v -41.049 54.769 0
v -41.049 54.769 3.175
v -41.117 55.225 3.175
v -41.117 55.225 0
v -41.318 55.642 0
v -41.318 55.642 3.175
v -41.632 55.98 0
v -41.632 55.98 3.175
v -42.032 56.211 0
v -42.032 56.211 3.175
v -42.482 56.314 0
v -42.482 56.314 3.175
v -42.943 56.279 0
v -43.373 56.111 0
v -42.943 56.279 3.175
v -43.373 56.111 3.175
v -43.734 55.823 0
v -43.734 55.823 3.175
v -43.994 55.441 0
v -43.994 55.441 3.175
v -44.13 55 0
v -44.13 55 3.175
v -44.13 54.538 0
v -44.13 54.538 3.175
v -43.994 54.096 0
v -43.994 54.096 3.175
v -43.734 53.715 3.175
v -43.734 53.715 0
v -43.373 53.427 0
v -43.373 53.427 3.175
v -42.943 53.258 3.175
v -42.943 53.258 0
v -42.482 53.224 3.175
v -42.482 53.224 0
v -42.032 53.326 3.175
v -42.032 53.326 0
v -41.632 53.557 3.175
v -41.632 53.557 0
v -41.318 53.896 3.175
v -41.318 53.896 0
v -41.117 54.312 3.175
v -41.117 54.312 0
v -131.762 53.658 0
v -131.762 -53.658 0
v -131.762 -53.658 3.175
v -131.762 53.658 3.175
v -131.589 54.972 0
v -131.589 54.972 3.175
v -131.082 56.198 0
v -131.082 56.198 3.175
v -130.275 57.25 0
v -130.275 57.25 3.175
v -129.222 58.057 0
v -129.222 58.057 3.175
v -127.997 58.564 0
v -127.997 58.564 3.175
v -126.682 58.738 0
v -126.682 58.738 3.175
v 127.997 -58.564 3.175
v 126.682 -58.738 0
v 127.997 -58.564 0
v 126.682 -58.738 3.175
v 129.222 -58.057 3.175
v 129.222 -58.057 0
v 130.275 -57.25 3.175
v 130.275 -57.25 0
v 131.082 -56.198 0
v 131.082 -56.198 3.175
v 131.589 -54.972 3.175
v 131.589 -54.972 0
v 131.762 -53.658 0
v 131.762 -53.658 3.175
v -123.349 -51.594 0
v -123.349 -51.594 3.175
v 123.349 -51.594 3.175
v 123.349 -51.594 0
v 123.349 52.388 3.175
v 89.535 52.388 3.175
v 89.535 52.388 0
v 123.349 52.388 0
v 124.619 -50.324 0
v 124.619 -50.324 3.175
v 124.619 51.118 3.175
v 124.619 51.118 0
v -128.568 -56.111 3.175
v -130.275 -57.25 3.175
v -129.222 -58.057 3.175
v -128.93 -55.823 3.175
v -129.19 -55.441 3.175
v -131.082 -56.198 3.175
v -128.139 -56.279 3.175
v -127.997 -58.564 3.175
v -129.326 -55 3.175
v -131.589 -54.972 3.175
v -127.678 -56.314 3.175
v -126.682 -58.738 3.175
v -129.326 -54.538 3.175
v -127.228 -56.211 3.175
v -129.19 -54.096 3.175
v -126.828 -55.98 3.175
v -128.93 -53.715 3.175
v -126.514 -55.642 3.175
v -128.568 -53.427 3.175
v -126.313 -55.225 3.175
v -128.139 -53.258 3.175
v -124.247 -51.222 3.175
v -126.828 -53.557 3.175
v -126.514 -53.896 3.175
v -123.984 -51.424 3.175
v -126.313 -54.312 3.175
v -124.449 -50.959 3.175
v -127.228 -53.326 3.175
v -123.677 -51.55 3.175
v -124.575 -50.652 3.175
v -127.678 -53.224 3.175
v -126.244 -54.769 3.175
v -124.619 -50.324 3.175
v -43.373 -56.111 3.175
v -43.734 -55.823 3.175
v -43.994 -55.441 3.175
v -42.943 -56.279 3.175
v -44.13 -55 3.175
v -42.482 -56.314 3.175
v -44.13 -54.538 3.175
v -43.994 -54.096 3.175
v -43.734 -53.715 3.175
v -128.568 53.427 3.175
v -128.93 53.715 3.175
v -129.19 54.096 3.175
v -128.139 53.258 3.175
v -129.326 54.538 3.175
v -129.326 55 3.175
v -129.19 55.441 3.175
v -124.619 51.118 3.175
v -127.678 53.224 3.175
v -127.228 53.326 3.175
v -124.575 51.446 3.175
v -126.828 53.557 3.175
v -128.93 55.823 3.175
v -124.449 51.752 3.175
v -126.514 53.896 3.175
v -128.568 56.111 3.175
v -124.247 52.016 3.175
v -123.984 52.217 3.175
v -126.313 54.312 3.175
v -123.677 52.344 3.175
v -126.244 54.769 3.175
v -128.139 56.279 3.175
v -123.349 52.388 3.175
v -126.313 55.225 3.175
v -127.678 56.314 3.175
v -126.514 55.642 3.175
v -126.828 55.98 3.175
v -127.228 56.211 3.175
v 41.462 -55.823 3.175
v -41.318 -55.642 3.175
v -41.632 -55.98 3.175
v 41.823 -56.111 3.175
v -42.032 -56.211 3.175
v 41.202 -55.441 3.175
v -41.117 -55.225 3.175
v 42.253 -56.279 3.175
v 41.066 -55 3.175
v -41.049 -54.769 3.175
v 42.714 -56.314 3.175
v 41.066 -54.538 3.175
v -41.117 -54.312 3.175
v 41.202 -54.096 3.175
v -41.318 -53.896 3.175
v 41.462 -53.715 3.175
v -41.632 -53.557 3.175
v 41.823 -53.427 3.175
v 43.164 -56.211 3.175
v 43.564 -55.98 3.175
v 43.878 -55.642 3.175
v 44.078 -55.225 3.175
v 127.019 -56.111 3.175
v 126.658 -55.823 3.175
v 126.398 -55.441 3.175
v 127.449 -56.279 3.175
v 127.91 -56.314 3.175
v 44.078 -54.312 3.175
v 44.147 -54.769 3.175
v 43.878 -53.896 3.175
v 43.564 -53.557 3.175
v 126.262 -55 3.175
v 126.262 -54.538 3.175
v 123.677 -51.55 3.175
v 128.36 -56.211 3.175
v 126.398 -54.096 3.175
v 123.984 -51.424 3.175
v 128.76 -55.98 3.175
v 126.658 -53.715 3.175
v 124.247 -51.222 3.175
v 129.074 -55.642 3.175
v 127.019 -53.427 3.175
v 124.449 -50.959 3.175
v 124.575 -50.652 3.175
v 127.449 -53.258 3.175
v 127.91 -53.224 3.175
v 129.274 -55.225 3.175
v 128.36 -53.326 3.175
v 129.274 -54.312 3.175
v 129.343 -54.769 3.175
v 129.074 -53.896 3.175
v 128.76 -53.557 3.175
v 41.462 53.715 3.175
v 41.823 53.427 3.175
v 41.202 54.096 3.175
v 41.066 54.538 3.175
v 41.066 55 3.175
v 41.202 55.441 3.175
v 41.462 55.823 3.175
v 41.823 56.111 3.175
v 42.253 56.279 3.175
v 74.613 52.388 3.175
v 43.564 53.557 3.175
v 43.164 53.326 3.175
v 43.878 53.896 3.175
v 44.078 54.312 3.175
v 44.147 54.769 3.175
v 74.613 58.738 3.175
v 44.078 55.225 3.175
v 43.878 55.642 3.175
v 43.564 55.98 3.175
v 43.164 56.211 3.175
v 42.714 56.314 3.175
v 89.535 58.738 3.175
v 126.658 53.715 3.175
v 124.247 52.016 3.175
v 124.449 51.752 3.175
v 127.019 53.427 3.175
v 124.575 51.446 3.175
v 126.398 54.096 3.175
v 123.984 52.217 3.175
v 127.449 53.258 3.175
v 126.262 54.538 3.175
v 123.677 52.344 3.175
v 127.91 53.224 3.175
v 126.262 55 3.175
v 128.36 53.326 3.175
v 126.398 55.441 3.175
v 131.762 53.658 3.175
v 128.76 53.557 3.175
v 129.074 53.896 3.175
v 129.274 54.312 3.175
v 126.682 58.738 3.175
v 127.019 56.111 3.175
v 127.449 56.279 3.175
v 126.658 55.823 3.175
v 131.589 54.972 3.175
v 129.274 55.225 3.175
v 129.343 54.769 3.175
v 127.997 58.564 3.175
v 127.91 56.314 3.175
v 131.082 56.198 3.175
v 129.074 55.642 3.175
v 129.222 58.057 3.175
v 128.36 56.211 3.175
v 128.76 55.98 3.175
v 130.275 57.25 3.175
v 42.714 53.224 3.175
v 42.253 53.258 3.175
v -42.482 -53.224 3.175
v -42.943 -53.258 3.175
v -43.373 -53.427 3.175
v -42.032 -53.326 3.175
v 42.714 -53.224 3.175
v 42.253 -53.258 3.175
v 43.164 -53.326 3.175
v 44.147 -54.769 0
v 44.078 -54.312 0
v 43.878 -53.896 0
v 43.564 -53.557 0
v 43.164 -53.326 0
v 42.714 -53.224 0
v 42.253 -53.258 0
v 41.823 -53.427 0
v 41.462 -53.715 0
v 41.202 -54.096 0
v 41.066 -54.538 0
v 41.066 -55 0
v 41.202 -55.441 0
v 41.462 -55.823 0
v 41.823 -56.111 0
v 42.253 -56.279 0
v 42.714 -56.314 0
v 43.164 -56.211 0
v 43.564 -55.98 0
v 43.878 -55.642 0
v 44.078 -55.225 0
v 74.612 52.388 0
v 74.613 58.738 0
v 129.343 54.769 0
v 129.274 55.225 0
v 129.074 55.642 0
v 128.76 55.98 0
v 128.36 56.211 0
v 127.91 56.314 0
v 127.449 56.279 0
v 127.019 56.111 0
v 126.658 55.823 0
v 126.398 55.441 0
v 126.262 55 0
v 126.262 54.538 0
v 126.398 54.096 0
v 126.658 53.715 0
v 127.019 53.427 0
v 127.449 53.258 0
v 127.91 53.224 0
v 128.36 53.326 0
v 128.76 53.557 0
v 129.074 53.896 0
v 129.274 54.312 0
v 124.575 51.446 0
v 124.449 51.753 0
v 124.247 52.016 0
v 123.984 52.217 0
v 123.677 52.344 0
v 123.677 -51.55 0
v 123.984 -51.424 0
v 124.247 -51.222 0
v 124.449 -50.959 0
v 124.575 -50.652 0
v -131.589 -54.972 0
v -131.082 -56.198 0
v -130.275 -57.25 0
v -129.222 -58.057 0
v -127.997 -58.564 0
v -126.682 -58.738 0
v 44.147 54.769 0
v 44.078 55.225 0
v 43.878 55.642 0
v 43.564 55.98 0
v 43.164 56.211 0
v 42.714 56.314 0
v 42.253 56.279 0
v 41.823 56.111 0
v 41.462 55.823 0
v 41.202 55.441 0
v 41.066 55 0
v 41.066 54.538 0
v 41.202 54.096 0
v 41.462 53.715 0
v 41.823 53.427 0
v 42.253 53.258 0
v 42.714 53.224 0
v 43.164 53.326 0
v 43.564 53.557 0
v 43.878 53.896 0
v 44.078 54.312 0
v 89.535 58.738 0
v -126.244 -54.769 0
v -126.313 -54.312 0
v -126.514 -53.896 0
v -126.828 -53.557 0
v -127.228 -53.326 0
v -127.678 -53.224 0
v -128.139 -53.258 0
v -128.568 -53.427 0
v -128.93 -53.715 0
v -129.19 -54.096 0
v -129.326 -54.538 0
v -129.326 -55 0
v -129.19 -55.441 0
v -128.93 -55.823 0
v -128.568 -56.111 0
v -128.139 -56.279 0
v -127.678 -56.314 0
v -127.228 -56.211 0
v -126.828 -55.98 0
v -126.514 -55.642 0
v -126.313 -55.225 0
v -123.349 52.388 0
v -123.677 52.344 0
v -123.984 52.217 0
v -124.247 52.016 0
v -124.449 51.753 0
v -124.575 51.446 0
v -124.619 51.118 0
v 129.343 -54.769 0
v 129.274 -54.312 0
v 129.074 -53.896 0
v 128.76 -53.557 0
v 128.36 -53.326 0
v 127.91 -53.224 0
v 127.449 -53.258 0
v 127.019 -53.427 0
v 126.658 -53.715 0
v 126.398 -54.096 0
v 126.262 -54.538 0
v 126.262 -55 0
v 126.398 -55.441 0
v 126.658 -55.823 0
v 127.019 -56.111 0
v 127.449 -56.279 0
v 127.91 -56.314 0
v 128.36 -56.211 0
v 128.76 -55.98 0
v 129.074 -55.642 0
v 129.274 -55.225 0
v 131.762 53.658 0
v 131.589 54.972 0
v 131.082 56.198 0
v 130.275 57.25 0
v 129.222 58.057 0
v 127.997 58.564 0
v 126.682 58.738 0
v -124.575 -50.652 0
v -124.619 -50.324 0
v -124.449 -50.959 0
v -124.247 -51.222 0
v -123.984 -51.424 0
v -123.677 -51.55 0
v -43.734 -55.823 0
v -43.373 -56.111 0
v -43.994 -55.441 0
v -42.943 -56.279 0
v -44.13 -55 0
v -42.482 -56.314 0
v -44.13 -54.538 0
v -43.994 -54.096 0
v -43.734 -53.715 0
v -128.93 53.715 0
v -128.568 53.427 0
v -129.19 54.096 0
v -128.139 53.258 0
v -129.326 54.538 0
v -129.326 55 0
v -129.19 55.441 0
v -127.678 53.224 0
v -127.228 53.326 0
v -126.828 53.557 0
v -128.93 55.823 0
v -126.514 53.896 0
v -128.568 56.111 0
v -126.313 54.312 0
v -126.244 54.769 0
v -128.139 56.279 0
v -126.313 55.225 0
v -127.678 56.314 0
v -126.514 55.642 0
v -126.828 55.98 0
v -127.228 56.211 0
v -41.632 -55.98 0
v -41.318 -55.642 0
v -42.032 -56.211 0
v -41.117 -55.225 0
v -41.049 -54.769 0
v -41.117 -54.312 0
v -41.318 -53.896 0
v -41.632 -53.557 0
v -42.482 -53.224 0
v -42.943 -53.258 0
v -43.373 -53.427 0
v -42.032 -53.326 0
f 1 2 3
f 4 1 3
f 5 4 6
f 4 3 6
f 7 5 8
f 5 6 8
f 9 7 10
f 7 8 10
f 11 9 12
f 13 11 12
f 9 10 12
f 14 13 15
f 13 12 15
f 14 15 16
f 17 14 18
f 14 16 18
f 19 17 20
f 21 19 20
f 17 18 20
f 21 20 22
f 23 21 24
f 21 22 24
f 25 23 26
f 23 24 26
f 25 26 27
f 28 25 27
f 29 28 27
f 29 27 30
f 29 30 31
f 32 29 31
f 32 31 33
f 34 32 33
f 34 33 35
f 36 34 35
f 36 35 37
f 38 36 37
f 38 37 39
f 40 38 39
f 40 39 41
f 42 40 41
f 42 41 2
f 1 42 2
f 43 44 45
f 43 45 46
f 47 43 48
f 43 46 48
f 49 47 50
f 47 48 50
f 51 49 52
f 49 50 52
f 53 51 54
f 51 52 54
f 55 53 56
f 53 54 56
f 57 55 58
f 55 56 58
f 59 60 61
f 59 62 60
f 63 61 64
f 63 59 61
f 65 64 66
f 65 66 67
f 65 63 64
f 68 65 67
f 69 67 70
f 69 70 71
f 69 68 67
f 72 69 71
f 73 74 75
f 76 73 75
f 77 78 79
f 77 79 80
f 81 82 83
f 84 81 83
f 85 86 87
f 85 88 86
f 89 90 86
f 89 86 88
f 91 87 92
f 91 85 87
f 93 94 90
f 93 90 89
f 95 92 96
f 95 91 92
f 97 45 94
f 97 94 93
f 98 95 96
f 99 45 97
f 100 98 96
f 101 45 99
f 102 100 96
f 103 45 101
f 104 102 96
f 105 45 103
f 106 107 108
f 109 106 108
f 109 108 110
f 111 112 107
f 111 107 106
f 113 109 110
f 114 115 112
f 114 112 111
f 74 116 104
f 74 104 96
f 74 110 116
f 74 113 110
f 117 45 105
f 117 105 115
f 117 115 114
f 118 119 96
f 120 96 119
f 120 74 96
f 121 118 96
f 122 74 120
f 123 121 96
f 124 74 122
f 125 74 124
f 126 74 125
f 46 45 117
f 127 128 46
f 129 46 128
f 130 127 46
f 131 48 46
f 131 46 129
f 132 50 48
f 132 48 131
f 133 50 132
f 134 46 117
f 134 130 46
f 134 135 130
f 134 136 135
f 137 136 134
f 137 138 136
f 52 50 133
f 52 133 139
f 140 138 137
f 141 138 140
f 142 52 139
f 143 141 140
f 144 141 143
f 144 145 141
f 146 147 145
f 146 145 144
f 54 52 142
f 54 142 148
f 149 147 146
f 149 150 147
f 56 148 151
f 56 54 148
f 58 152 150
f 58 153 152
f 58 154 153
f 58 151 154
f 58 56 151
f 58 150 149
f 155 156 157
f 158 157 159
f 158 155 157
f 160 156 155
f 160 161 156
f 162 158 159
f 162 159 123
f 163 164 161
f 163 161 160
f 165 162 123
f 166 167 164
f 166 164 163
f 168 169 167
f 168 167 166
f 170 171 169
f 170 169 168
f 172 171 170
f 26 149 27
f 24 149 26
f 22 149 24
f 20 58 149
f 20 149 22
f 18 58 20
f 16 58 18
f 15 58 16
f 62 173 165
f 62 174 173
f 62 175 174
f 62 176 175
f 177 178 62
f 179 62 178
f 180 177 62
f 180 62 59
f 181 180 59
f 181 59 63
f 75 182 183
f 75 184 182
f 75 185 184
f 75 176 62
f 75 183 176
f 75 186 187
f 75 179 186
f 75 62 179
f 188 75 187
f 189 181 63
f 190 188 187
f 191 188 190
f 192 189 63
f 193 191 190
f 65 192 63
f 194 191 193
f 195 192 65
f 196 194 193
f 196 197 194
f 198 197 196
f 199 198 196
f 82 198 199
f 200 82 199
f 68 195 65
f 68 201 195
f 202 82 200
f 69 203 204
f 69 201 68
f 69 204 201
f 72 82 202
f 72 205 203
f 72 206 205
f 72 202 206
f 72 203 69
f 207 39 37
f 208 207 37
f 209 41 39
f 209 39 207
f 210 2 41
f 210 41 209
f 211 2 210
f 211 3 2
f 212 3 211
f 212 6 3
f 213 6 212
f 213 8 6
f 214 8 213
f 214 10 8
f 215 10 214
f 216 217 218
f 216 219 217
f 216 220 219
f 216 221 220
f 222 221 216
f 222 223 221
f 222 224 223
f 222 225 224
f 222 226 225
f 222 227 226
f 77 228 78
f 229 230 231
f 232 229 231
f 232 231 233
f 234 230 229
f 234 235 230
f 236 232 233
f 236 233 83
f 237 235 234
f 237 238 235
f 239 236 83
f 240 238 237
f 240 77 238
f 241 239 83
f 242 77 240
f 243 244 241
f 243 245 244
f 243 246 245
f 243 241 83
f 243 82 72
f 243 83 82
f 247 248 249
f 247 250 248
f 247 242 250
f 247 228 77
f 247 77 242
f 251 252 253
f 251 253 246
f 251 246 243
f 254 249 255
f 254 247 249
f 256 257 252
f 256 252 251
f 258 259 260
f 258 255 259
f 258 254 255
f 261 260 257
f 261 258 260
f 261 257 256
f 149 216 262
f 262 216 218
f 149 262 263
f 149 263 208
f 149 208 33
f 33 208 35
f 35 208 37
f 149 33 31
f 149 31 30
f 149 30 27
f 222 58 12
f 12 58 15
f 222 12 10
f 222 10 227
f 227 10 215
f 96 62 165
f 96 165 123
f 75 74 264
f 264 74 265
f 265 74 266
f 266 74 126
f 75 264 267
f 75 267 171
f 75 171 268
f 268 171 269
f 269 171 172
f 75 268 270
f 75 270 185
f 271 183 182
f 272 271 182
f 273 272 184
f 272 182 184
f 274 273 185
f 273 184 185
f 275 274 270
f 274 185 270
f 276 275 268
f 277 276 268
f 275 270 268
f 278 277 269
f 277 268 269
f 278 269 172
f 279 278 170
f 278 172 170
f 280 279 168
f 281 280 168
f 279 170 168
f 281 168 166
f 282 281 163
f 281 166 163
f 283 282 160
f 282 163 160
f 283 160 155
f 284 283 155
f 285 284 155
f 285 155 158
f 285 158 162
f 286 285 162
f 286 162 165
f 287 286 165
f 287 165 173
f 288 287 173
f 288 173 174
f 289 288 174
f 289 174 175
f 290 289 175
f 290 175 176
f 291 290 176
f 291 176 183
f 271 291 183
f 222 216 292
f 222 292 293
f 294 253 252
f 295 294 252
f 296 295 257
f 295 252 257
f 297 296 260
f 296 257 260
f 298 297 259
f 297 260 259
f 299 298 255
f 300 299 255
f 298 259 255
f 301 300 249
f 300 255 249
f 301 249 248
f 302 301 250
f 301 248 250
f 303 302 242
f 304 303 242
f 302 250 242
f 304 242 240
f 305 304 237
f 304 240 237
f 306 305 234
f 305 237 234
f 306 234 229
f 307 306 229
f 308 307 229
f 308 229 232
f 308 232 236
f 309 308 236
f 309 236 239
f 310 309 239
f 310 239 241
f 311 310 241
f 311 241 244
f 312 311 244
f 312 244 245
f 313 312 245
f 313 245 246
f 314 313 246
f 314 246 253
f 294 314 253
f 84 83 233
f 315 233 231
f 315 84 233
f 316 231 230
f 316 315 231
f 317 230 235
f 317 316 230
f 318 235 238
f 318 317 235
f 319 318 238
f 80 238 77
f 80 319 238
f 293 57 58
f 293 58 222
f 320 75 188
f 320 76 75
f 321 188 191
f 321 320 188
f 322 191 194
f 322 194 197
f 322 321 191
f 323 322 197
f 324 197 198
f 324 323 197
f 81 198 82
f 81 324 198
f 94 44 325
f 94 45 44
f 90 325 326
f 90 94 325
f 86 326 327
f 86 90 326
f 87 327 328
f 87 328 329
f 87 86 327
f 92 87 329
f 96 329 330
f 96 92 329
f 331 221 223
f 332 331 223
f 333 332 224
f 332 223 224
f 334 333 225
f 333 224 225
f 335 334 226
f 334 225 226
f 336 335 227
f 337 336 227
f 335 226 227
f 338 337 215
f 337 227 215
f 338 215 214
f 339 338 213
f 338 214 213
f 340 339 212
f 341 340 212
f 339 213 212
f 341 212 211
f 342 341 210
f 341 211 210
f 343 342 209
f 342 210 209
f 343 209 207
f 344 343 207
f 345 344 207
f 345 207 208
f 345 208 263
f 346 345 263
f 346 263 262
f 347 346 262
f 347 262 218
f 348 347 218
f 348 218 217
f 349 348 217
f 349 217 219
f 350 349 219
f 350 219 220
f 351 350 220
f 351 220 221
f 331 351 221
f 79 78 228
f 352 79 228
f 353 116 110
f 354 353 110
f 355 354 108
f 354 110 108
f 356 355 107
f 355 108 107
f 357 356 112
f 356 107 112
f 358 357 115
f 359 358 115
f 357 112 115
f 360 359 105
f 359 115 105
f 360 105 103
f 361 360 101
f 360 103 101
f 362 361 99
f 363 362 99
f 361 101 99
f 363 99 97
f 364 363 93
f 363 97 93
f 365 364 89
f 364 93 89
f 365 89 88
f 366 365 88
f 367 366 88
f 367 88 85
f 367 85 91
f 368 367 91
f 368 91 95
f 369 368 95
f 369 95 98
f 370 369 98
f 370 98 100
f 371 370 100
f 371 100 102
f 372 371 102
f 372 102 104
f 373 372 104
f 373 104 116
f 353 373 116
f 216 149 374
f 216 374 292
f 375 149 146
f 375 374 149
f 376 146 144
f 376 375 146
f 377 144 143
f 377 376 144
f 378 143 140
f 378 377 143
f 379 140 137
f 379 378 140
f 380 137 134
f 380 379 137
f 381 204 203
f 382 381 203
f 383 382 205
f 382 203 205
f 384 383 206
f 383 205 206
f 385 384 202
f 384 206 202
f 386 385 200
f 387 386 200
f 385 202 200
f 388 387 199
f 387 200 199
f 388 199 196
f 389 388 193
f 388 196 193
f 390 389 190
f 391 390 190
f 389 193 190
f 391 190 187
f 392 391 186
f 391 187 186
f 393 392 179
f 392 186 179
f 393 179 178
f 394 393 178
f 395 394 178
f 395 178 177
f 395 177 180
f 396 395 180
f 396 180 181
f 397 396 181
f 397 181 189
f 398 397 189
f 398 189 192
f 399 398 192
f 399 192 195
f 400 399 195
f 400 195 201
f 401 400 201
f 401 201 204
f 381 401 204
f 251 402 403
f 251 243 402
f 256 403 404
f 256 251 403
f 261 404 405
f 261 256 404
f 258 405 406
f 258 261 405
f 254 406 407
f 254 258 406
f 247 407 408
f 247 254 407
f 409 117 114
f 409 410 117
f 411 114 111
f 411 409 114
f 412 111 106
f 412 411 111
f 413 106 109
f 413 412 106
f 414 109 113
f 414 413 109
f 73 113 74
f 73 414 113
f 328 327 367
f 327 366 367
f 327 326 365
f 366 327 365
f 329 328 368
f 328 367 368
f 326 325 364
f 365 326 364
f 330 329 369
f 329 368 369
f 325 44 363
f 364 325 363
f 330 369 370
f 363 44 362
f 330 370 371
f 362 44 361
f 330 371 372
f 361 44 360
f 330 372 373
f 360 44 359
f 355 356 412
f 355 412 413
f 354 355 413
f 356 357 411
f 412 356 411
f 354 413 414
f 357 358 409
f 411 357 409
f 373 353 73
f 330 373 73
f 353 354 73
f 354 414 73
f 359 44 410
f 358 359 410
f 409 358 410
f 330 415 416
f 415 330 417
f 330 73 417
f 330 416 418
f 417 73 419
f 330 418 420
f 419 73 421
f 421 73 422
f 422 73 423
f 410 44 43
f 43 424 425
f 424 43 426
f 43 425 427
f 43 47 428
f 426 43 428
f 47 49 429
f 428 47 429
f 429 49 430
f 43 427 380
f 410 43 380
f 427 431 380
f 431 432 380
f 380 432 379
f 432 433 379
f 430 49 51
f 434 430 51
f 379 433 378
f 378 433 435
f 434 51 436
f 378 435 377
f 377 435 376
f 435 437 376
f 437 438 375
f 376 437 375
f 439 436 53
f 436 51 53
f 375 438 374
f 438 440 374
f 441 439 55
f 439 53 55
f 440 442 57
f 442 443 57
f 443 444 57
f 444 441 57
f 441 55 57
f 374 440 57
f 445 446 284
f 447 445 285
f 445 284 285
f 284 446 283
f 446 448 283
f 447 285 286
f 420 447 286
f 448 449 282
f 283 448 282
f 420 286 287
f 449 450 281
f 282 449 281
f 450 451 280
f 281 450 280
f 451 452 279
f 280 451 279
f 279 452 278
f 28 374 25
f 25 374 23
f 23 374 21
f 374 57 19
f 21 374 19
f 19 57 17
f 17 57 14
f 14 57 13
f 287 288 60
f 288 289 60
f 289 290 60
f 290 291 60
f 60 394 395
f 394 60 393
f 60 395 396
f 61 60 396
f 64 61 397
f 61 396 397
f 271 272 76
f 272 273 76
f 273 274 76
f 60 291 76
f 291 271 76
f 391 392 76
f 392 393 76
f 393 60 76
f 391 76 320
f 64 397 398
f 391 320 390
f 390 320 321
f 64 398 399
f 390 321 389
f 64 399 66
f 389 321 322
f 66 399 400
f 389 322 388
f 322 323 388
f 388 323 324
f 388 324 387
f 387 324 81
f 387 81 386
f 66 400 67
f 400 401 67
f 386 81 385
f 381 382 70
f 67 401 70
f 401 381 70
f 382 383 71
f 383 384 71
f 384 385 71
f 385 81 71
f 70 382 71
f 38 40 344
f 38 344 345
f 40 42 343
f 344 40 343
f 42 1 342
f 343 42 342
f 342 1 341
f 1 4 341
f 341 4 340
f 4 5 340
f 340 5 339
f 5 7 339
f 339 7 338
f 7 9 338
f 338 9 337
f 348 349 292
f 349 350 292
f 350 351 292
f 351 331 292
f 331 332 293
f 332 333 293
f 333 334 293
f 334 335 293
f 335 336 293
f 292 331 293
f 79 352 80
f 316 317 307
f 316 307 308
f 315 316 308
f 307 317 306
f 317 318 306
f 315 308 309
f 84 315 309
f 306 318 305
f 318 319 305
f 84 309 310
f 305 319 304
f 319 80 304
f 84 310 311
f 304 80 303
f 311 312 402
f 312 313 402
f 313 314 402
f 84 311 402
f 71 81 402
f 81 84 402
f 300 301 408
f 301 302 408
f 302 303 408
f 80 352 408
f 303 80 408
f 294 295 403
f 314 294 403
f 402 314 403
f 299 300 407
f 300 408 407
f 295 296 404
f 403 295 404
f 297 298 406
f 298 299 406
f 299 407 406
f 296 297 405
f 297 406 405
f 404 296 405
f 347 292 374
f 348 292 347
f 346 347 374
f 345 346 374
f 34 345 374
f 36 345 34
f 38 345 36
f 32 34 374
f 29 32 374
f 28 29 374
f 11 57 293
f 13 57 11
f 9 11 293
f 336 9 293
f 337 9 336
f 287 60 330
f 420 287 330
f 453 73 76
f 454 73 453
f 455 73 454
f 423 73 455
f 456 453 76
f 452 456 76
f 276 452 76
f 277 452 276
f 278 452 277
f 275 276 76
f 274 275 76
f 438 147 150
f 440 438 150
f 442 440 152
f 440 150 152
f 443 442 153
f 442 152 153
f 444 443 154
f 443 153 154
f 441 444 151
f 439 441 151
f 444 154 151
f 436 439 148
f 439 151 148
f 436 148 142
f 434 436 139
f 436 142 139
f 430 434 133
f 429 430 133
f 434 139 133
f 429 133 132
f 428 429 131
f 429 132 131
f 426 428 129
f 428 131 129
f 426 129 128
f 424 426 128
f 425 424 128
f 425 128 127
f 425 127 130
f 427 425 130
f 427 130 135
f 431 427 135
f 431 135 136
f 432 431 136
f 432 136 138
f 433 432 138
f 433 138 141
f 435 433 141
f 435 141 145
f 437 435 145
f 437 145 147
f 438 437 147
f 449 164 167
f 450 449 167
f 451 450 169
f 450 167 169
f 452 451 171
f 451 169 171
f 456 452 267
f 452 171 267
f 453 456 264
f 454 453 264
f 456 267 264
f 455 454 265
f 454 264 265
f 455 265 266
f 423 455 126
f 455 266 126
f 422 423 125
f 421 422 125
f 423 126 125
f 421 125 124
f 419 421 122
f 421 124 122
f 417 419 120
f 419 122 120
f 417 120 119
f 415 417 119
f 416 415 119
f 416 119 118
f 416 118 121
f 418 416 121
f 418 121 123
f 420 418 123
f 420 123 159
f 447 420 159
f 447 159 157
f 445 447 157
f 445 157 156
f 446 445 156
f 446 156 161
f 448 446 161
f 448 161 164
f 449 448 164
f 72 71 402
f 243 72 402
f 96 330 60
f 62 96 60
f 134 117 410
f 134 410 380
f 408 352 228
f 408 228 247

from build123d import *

# Parameters (mm, degrees)
SKETCH_W        = 263.525
SKETCH_H        = 117.475
PAD_DEPTH       = 3.175
SKETCH002_W     = 249.2375
SKETCH002_H     = 103.98125
POCKET_DEPTH    = 3.176
SKETCH003_W     = 14.9225
SKETCH003_H     = 25.4
POCKET001_DEPTH = 3.176
SKETCH001_R     = 1.5494
HOLE_DEPTH      = 3.176
FILLET_R        = 5.08
FILLET001_R     = 1.27


with BuildPart() as part:
    # Sketch → Pad (new body)
    with BuildSketch(Plane.XY):
        Rectangle(SKETCH_W, SKETCH_H)
    extrude(amount=PAD_DEPTH)

    # Sketch002 (on Face6 of Pad) → Pocket (cut, through all)
    with BuildSketch(Plane.XY.offset(3.175)):
        with Locations((0, 0.396875)):
            Rectangle(SKETCH002_W, SKETCH002_H)
    extrude(amount=-POCKET_DEPTH, mode=Mode.SUBTRACT)

    # Sketch003 (on Face5 of Pocket) → Pocket001 (cut, through all)
    with BuildSketch(Plane.XY.offset(3.175)):
        with Locations((82.07375, 46.0375)):
            Rectangle(SKETCH003_W, SKETCH003_H)
    extrude(amount=-POCKET001_DEPTH, mode=Mode.SUBTRACT)

    # Sketch001 (on Face6 of Pad) → Hole (cut, through all)
    with BuildSketch(Plane.XY.offset(3.175)):
        with Locations((-42.597917, 54.76875)):
            Circle(SKETCH001_R)
        with Locations((42.597917, 54.76875)):
            Circle(SKETCH001_R)
        with Locations((42.597917, -54.76875)):
            Circle(SKETCH001_R)
        with Locations((-42.597917, -54.76875)):
            Circle(SKETCH001_R)
        with Locations((-127.79375, -54.76875)):
            Circle(SKETCH001_R)
        with Locations((-127.79375, 54.76875)):
            Circle(SKETCH001_R)
        with Locations((127.79375, 54.76875)):
            Circle(SKETCH001_R)
        with Locations((127.79375, -54.76875)):
            Circle(SKETCH001_R)
    extrude(amount=-HOLE_DEPTH, mode=Mode.SUBTRACT)

    # Fillet
    fillet_edges = [part.edges().sort_by_distance(p)[0] for p in [
        (-131.7625, 58.7375, 1.5875),
        (-131.7625, -58.7375, 1.5875),
        (131.7625, -58.7375, 1.5875),
        (131.7625, 58.7375, 1.5875),
    ]]
    fillet(fillet_edges, radius=FILLET_R)

    # Fillet001
    fillet001_edges = [part.edges().sort_by_distance(p)[0] for p in [
        (-124.61875, 52.3875, 1.5875),
        (124.61875, 52.3875, 1.5875),
        (-124.61875, -51.59375, 1.5875),
        (124.61875, -51.59375, 1.5875),
    ]]
    fillet(fillet001_edges, radius=FILLET001_R)


solid = part.part
